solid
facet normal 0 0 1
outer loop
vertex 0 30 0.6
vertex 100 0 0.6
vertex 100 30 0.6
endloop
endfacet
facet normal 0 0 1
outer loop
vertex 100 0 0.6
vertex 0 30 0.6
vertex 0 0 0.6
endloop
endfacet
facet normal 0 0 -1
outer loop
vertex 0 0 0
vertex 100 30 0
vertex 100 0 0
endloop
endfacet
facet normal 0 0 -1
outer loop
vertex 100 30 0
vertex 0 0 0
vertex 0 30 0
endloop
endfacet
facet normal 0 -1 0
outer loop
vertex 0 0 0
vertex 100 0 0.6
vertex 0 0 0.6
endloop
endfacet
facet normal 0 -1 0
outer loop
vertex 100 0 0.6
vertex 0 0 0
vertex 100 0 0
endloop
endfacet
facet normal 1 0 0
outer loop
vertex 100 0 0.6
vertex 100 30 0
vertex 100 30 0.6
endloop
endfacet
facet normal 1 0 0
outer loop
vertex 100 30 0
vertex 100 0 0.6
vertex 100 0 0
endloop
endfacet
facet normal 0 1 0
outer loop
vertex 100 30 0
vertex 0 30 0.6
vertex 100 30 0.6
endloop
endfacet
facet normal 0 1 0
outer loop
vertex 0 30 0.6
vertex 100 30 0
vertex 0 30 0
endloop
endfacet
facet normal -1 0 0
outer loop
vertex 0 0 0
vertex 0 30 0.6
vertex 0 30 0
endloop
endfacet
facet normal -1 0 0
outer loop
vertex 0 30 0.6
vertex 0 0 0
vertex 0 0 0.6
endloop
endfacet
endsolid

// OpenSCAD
// Bookmark generator
// Generate monogrammed bookmarks that incidentally help clean the print bed

/*[General]*/
// Layer thickness in mm
layer_thickness = 0.2; 
// Total layers to use for model
layer_count = 3;
// Monogram - leave blank for none
monogram = ""; 
// Width in mm. See notes on length for filling bed area.
bookmark_width = 30; 
// Length in mm. May need adjustment if multiple instances (in the slicer) don't pack neatly to fill your bed area.
bookmark_length = 100; 

/*[Plating]*/
// Number of copies to stack end to end lengthwise
plate_count_across = 1;
// Number of copies to stack side to side
plate_count_down = 1;
// Space between instances in mm
plate_spacing = 1; 

/*[Advanced]*/
// Additional movement for monogram along length
monogram_x_move = 0; 
// Additional movement for monogram along width
monogram_y_move = 0; 
// Use Help / Font list in OpenSCAD to see the exact text for available fonts and styles on your computer
monogram_font = "Liberation Mono:style=Regular"; 

module bookmark()
{
  difference()
  {
    cube([bookmark_length, bookmark_width, layer_thickness * layer_count]);
    if (monogram != "")
    {
        mg_size = bookmark_width - 8;
        // X translation should be half of character width
        translate([mg_size * 0.6 + monogram_x_move,
            bookmark_width/2 + monogram_y_move,
            (layer_count-1) * layer_thickness])
          rotate([0,0,90])
          linear_extrude(layer_thickness*2) 
            text(monogram, size=mg_size, font=monogram_font, halign="center", valign="center");
    }
  }
}

for (x=[1:plate_count_across])
    for (y=[1:plate_count_down])
        translate([(bookmark_length + plate_spacing) * (x-1),
                    (bookmark_width + plate_spacing) * (y-1),
                    0])
            bookmark();
